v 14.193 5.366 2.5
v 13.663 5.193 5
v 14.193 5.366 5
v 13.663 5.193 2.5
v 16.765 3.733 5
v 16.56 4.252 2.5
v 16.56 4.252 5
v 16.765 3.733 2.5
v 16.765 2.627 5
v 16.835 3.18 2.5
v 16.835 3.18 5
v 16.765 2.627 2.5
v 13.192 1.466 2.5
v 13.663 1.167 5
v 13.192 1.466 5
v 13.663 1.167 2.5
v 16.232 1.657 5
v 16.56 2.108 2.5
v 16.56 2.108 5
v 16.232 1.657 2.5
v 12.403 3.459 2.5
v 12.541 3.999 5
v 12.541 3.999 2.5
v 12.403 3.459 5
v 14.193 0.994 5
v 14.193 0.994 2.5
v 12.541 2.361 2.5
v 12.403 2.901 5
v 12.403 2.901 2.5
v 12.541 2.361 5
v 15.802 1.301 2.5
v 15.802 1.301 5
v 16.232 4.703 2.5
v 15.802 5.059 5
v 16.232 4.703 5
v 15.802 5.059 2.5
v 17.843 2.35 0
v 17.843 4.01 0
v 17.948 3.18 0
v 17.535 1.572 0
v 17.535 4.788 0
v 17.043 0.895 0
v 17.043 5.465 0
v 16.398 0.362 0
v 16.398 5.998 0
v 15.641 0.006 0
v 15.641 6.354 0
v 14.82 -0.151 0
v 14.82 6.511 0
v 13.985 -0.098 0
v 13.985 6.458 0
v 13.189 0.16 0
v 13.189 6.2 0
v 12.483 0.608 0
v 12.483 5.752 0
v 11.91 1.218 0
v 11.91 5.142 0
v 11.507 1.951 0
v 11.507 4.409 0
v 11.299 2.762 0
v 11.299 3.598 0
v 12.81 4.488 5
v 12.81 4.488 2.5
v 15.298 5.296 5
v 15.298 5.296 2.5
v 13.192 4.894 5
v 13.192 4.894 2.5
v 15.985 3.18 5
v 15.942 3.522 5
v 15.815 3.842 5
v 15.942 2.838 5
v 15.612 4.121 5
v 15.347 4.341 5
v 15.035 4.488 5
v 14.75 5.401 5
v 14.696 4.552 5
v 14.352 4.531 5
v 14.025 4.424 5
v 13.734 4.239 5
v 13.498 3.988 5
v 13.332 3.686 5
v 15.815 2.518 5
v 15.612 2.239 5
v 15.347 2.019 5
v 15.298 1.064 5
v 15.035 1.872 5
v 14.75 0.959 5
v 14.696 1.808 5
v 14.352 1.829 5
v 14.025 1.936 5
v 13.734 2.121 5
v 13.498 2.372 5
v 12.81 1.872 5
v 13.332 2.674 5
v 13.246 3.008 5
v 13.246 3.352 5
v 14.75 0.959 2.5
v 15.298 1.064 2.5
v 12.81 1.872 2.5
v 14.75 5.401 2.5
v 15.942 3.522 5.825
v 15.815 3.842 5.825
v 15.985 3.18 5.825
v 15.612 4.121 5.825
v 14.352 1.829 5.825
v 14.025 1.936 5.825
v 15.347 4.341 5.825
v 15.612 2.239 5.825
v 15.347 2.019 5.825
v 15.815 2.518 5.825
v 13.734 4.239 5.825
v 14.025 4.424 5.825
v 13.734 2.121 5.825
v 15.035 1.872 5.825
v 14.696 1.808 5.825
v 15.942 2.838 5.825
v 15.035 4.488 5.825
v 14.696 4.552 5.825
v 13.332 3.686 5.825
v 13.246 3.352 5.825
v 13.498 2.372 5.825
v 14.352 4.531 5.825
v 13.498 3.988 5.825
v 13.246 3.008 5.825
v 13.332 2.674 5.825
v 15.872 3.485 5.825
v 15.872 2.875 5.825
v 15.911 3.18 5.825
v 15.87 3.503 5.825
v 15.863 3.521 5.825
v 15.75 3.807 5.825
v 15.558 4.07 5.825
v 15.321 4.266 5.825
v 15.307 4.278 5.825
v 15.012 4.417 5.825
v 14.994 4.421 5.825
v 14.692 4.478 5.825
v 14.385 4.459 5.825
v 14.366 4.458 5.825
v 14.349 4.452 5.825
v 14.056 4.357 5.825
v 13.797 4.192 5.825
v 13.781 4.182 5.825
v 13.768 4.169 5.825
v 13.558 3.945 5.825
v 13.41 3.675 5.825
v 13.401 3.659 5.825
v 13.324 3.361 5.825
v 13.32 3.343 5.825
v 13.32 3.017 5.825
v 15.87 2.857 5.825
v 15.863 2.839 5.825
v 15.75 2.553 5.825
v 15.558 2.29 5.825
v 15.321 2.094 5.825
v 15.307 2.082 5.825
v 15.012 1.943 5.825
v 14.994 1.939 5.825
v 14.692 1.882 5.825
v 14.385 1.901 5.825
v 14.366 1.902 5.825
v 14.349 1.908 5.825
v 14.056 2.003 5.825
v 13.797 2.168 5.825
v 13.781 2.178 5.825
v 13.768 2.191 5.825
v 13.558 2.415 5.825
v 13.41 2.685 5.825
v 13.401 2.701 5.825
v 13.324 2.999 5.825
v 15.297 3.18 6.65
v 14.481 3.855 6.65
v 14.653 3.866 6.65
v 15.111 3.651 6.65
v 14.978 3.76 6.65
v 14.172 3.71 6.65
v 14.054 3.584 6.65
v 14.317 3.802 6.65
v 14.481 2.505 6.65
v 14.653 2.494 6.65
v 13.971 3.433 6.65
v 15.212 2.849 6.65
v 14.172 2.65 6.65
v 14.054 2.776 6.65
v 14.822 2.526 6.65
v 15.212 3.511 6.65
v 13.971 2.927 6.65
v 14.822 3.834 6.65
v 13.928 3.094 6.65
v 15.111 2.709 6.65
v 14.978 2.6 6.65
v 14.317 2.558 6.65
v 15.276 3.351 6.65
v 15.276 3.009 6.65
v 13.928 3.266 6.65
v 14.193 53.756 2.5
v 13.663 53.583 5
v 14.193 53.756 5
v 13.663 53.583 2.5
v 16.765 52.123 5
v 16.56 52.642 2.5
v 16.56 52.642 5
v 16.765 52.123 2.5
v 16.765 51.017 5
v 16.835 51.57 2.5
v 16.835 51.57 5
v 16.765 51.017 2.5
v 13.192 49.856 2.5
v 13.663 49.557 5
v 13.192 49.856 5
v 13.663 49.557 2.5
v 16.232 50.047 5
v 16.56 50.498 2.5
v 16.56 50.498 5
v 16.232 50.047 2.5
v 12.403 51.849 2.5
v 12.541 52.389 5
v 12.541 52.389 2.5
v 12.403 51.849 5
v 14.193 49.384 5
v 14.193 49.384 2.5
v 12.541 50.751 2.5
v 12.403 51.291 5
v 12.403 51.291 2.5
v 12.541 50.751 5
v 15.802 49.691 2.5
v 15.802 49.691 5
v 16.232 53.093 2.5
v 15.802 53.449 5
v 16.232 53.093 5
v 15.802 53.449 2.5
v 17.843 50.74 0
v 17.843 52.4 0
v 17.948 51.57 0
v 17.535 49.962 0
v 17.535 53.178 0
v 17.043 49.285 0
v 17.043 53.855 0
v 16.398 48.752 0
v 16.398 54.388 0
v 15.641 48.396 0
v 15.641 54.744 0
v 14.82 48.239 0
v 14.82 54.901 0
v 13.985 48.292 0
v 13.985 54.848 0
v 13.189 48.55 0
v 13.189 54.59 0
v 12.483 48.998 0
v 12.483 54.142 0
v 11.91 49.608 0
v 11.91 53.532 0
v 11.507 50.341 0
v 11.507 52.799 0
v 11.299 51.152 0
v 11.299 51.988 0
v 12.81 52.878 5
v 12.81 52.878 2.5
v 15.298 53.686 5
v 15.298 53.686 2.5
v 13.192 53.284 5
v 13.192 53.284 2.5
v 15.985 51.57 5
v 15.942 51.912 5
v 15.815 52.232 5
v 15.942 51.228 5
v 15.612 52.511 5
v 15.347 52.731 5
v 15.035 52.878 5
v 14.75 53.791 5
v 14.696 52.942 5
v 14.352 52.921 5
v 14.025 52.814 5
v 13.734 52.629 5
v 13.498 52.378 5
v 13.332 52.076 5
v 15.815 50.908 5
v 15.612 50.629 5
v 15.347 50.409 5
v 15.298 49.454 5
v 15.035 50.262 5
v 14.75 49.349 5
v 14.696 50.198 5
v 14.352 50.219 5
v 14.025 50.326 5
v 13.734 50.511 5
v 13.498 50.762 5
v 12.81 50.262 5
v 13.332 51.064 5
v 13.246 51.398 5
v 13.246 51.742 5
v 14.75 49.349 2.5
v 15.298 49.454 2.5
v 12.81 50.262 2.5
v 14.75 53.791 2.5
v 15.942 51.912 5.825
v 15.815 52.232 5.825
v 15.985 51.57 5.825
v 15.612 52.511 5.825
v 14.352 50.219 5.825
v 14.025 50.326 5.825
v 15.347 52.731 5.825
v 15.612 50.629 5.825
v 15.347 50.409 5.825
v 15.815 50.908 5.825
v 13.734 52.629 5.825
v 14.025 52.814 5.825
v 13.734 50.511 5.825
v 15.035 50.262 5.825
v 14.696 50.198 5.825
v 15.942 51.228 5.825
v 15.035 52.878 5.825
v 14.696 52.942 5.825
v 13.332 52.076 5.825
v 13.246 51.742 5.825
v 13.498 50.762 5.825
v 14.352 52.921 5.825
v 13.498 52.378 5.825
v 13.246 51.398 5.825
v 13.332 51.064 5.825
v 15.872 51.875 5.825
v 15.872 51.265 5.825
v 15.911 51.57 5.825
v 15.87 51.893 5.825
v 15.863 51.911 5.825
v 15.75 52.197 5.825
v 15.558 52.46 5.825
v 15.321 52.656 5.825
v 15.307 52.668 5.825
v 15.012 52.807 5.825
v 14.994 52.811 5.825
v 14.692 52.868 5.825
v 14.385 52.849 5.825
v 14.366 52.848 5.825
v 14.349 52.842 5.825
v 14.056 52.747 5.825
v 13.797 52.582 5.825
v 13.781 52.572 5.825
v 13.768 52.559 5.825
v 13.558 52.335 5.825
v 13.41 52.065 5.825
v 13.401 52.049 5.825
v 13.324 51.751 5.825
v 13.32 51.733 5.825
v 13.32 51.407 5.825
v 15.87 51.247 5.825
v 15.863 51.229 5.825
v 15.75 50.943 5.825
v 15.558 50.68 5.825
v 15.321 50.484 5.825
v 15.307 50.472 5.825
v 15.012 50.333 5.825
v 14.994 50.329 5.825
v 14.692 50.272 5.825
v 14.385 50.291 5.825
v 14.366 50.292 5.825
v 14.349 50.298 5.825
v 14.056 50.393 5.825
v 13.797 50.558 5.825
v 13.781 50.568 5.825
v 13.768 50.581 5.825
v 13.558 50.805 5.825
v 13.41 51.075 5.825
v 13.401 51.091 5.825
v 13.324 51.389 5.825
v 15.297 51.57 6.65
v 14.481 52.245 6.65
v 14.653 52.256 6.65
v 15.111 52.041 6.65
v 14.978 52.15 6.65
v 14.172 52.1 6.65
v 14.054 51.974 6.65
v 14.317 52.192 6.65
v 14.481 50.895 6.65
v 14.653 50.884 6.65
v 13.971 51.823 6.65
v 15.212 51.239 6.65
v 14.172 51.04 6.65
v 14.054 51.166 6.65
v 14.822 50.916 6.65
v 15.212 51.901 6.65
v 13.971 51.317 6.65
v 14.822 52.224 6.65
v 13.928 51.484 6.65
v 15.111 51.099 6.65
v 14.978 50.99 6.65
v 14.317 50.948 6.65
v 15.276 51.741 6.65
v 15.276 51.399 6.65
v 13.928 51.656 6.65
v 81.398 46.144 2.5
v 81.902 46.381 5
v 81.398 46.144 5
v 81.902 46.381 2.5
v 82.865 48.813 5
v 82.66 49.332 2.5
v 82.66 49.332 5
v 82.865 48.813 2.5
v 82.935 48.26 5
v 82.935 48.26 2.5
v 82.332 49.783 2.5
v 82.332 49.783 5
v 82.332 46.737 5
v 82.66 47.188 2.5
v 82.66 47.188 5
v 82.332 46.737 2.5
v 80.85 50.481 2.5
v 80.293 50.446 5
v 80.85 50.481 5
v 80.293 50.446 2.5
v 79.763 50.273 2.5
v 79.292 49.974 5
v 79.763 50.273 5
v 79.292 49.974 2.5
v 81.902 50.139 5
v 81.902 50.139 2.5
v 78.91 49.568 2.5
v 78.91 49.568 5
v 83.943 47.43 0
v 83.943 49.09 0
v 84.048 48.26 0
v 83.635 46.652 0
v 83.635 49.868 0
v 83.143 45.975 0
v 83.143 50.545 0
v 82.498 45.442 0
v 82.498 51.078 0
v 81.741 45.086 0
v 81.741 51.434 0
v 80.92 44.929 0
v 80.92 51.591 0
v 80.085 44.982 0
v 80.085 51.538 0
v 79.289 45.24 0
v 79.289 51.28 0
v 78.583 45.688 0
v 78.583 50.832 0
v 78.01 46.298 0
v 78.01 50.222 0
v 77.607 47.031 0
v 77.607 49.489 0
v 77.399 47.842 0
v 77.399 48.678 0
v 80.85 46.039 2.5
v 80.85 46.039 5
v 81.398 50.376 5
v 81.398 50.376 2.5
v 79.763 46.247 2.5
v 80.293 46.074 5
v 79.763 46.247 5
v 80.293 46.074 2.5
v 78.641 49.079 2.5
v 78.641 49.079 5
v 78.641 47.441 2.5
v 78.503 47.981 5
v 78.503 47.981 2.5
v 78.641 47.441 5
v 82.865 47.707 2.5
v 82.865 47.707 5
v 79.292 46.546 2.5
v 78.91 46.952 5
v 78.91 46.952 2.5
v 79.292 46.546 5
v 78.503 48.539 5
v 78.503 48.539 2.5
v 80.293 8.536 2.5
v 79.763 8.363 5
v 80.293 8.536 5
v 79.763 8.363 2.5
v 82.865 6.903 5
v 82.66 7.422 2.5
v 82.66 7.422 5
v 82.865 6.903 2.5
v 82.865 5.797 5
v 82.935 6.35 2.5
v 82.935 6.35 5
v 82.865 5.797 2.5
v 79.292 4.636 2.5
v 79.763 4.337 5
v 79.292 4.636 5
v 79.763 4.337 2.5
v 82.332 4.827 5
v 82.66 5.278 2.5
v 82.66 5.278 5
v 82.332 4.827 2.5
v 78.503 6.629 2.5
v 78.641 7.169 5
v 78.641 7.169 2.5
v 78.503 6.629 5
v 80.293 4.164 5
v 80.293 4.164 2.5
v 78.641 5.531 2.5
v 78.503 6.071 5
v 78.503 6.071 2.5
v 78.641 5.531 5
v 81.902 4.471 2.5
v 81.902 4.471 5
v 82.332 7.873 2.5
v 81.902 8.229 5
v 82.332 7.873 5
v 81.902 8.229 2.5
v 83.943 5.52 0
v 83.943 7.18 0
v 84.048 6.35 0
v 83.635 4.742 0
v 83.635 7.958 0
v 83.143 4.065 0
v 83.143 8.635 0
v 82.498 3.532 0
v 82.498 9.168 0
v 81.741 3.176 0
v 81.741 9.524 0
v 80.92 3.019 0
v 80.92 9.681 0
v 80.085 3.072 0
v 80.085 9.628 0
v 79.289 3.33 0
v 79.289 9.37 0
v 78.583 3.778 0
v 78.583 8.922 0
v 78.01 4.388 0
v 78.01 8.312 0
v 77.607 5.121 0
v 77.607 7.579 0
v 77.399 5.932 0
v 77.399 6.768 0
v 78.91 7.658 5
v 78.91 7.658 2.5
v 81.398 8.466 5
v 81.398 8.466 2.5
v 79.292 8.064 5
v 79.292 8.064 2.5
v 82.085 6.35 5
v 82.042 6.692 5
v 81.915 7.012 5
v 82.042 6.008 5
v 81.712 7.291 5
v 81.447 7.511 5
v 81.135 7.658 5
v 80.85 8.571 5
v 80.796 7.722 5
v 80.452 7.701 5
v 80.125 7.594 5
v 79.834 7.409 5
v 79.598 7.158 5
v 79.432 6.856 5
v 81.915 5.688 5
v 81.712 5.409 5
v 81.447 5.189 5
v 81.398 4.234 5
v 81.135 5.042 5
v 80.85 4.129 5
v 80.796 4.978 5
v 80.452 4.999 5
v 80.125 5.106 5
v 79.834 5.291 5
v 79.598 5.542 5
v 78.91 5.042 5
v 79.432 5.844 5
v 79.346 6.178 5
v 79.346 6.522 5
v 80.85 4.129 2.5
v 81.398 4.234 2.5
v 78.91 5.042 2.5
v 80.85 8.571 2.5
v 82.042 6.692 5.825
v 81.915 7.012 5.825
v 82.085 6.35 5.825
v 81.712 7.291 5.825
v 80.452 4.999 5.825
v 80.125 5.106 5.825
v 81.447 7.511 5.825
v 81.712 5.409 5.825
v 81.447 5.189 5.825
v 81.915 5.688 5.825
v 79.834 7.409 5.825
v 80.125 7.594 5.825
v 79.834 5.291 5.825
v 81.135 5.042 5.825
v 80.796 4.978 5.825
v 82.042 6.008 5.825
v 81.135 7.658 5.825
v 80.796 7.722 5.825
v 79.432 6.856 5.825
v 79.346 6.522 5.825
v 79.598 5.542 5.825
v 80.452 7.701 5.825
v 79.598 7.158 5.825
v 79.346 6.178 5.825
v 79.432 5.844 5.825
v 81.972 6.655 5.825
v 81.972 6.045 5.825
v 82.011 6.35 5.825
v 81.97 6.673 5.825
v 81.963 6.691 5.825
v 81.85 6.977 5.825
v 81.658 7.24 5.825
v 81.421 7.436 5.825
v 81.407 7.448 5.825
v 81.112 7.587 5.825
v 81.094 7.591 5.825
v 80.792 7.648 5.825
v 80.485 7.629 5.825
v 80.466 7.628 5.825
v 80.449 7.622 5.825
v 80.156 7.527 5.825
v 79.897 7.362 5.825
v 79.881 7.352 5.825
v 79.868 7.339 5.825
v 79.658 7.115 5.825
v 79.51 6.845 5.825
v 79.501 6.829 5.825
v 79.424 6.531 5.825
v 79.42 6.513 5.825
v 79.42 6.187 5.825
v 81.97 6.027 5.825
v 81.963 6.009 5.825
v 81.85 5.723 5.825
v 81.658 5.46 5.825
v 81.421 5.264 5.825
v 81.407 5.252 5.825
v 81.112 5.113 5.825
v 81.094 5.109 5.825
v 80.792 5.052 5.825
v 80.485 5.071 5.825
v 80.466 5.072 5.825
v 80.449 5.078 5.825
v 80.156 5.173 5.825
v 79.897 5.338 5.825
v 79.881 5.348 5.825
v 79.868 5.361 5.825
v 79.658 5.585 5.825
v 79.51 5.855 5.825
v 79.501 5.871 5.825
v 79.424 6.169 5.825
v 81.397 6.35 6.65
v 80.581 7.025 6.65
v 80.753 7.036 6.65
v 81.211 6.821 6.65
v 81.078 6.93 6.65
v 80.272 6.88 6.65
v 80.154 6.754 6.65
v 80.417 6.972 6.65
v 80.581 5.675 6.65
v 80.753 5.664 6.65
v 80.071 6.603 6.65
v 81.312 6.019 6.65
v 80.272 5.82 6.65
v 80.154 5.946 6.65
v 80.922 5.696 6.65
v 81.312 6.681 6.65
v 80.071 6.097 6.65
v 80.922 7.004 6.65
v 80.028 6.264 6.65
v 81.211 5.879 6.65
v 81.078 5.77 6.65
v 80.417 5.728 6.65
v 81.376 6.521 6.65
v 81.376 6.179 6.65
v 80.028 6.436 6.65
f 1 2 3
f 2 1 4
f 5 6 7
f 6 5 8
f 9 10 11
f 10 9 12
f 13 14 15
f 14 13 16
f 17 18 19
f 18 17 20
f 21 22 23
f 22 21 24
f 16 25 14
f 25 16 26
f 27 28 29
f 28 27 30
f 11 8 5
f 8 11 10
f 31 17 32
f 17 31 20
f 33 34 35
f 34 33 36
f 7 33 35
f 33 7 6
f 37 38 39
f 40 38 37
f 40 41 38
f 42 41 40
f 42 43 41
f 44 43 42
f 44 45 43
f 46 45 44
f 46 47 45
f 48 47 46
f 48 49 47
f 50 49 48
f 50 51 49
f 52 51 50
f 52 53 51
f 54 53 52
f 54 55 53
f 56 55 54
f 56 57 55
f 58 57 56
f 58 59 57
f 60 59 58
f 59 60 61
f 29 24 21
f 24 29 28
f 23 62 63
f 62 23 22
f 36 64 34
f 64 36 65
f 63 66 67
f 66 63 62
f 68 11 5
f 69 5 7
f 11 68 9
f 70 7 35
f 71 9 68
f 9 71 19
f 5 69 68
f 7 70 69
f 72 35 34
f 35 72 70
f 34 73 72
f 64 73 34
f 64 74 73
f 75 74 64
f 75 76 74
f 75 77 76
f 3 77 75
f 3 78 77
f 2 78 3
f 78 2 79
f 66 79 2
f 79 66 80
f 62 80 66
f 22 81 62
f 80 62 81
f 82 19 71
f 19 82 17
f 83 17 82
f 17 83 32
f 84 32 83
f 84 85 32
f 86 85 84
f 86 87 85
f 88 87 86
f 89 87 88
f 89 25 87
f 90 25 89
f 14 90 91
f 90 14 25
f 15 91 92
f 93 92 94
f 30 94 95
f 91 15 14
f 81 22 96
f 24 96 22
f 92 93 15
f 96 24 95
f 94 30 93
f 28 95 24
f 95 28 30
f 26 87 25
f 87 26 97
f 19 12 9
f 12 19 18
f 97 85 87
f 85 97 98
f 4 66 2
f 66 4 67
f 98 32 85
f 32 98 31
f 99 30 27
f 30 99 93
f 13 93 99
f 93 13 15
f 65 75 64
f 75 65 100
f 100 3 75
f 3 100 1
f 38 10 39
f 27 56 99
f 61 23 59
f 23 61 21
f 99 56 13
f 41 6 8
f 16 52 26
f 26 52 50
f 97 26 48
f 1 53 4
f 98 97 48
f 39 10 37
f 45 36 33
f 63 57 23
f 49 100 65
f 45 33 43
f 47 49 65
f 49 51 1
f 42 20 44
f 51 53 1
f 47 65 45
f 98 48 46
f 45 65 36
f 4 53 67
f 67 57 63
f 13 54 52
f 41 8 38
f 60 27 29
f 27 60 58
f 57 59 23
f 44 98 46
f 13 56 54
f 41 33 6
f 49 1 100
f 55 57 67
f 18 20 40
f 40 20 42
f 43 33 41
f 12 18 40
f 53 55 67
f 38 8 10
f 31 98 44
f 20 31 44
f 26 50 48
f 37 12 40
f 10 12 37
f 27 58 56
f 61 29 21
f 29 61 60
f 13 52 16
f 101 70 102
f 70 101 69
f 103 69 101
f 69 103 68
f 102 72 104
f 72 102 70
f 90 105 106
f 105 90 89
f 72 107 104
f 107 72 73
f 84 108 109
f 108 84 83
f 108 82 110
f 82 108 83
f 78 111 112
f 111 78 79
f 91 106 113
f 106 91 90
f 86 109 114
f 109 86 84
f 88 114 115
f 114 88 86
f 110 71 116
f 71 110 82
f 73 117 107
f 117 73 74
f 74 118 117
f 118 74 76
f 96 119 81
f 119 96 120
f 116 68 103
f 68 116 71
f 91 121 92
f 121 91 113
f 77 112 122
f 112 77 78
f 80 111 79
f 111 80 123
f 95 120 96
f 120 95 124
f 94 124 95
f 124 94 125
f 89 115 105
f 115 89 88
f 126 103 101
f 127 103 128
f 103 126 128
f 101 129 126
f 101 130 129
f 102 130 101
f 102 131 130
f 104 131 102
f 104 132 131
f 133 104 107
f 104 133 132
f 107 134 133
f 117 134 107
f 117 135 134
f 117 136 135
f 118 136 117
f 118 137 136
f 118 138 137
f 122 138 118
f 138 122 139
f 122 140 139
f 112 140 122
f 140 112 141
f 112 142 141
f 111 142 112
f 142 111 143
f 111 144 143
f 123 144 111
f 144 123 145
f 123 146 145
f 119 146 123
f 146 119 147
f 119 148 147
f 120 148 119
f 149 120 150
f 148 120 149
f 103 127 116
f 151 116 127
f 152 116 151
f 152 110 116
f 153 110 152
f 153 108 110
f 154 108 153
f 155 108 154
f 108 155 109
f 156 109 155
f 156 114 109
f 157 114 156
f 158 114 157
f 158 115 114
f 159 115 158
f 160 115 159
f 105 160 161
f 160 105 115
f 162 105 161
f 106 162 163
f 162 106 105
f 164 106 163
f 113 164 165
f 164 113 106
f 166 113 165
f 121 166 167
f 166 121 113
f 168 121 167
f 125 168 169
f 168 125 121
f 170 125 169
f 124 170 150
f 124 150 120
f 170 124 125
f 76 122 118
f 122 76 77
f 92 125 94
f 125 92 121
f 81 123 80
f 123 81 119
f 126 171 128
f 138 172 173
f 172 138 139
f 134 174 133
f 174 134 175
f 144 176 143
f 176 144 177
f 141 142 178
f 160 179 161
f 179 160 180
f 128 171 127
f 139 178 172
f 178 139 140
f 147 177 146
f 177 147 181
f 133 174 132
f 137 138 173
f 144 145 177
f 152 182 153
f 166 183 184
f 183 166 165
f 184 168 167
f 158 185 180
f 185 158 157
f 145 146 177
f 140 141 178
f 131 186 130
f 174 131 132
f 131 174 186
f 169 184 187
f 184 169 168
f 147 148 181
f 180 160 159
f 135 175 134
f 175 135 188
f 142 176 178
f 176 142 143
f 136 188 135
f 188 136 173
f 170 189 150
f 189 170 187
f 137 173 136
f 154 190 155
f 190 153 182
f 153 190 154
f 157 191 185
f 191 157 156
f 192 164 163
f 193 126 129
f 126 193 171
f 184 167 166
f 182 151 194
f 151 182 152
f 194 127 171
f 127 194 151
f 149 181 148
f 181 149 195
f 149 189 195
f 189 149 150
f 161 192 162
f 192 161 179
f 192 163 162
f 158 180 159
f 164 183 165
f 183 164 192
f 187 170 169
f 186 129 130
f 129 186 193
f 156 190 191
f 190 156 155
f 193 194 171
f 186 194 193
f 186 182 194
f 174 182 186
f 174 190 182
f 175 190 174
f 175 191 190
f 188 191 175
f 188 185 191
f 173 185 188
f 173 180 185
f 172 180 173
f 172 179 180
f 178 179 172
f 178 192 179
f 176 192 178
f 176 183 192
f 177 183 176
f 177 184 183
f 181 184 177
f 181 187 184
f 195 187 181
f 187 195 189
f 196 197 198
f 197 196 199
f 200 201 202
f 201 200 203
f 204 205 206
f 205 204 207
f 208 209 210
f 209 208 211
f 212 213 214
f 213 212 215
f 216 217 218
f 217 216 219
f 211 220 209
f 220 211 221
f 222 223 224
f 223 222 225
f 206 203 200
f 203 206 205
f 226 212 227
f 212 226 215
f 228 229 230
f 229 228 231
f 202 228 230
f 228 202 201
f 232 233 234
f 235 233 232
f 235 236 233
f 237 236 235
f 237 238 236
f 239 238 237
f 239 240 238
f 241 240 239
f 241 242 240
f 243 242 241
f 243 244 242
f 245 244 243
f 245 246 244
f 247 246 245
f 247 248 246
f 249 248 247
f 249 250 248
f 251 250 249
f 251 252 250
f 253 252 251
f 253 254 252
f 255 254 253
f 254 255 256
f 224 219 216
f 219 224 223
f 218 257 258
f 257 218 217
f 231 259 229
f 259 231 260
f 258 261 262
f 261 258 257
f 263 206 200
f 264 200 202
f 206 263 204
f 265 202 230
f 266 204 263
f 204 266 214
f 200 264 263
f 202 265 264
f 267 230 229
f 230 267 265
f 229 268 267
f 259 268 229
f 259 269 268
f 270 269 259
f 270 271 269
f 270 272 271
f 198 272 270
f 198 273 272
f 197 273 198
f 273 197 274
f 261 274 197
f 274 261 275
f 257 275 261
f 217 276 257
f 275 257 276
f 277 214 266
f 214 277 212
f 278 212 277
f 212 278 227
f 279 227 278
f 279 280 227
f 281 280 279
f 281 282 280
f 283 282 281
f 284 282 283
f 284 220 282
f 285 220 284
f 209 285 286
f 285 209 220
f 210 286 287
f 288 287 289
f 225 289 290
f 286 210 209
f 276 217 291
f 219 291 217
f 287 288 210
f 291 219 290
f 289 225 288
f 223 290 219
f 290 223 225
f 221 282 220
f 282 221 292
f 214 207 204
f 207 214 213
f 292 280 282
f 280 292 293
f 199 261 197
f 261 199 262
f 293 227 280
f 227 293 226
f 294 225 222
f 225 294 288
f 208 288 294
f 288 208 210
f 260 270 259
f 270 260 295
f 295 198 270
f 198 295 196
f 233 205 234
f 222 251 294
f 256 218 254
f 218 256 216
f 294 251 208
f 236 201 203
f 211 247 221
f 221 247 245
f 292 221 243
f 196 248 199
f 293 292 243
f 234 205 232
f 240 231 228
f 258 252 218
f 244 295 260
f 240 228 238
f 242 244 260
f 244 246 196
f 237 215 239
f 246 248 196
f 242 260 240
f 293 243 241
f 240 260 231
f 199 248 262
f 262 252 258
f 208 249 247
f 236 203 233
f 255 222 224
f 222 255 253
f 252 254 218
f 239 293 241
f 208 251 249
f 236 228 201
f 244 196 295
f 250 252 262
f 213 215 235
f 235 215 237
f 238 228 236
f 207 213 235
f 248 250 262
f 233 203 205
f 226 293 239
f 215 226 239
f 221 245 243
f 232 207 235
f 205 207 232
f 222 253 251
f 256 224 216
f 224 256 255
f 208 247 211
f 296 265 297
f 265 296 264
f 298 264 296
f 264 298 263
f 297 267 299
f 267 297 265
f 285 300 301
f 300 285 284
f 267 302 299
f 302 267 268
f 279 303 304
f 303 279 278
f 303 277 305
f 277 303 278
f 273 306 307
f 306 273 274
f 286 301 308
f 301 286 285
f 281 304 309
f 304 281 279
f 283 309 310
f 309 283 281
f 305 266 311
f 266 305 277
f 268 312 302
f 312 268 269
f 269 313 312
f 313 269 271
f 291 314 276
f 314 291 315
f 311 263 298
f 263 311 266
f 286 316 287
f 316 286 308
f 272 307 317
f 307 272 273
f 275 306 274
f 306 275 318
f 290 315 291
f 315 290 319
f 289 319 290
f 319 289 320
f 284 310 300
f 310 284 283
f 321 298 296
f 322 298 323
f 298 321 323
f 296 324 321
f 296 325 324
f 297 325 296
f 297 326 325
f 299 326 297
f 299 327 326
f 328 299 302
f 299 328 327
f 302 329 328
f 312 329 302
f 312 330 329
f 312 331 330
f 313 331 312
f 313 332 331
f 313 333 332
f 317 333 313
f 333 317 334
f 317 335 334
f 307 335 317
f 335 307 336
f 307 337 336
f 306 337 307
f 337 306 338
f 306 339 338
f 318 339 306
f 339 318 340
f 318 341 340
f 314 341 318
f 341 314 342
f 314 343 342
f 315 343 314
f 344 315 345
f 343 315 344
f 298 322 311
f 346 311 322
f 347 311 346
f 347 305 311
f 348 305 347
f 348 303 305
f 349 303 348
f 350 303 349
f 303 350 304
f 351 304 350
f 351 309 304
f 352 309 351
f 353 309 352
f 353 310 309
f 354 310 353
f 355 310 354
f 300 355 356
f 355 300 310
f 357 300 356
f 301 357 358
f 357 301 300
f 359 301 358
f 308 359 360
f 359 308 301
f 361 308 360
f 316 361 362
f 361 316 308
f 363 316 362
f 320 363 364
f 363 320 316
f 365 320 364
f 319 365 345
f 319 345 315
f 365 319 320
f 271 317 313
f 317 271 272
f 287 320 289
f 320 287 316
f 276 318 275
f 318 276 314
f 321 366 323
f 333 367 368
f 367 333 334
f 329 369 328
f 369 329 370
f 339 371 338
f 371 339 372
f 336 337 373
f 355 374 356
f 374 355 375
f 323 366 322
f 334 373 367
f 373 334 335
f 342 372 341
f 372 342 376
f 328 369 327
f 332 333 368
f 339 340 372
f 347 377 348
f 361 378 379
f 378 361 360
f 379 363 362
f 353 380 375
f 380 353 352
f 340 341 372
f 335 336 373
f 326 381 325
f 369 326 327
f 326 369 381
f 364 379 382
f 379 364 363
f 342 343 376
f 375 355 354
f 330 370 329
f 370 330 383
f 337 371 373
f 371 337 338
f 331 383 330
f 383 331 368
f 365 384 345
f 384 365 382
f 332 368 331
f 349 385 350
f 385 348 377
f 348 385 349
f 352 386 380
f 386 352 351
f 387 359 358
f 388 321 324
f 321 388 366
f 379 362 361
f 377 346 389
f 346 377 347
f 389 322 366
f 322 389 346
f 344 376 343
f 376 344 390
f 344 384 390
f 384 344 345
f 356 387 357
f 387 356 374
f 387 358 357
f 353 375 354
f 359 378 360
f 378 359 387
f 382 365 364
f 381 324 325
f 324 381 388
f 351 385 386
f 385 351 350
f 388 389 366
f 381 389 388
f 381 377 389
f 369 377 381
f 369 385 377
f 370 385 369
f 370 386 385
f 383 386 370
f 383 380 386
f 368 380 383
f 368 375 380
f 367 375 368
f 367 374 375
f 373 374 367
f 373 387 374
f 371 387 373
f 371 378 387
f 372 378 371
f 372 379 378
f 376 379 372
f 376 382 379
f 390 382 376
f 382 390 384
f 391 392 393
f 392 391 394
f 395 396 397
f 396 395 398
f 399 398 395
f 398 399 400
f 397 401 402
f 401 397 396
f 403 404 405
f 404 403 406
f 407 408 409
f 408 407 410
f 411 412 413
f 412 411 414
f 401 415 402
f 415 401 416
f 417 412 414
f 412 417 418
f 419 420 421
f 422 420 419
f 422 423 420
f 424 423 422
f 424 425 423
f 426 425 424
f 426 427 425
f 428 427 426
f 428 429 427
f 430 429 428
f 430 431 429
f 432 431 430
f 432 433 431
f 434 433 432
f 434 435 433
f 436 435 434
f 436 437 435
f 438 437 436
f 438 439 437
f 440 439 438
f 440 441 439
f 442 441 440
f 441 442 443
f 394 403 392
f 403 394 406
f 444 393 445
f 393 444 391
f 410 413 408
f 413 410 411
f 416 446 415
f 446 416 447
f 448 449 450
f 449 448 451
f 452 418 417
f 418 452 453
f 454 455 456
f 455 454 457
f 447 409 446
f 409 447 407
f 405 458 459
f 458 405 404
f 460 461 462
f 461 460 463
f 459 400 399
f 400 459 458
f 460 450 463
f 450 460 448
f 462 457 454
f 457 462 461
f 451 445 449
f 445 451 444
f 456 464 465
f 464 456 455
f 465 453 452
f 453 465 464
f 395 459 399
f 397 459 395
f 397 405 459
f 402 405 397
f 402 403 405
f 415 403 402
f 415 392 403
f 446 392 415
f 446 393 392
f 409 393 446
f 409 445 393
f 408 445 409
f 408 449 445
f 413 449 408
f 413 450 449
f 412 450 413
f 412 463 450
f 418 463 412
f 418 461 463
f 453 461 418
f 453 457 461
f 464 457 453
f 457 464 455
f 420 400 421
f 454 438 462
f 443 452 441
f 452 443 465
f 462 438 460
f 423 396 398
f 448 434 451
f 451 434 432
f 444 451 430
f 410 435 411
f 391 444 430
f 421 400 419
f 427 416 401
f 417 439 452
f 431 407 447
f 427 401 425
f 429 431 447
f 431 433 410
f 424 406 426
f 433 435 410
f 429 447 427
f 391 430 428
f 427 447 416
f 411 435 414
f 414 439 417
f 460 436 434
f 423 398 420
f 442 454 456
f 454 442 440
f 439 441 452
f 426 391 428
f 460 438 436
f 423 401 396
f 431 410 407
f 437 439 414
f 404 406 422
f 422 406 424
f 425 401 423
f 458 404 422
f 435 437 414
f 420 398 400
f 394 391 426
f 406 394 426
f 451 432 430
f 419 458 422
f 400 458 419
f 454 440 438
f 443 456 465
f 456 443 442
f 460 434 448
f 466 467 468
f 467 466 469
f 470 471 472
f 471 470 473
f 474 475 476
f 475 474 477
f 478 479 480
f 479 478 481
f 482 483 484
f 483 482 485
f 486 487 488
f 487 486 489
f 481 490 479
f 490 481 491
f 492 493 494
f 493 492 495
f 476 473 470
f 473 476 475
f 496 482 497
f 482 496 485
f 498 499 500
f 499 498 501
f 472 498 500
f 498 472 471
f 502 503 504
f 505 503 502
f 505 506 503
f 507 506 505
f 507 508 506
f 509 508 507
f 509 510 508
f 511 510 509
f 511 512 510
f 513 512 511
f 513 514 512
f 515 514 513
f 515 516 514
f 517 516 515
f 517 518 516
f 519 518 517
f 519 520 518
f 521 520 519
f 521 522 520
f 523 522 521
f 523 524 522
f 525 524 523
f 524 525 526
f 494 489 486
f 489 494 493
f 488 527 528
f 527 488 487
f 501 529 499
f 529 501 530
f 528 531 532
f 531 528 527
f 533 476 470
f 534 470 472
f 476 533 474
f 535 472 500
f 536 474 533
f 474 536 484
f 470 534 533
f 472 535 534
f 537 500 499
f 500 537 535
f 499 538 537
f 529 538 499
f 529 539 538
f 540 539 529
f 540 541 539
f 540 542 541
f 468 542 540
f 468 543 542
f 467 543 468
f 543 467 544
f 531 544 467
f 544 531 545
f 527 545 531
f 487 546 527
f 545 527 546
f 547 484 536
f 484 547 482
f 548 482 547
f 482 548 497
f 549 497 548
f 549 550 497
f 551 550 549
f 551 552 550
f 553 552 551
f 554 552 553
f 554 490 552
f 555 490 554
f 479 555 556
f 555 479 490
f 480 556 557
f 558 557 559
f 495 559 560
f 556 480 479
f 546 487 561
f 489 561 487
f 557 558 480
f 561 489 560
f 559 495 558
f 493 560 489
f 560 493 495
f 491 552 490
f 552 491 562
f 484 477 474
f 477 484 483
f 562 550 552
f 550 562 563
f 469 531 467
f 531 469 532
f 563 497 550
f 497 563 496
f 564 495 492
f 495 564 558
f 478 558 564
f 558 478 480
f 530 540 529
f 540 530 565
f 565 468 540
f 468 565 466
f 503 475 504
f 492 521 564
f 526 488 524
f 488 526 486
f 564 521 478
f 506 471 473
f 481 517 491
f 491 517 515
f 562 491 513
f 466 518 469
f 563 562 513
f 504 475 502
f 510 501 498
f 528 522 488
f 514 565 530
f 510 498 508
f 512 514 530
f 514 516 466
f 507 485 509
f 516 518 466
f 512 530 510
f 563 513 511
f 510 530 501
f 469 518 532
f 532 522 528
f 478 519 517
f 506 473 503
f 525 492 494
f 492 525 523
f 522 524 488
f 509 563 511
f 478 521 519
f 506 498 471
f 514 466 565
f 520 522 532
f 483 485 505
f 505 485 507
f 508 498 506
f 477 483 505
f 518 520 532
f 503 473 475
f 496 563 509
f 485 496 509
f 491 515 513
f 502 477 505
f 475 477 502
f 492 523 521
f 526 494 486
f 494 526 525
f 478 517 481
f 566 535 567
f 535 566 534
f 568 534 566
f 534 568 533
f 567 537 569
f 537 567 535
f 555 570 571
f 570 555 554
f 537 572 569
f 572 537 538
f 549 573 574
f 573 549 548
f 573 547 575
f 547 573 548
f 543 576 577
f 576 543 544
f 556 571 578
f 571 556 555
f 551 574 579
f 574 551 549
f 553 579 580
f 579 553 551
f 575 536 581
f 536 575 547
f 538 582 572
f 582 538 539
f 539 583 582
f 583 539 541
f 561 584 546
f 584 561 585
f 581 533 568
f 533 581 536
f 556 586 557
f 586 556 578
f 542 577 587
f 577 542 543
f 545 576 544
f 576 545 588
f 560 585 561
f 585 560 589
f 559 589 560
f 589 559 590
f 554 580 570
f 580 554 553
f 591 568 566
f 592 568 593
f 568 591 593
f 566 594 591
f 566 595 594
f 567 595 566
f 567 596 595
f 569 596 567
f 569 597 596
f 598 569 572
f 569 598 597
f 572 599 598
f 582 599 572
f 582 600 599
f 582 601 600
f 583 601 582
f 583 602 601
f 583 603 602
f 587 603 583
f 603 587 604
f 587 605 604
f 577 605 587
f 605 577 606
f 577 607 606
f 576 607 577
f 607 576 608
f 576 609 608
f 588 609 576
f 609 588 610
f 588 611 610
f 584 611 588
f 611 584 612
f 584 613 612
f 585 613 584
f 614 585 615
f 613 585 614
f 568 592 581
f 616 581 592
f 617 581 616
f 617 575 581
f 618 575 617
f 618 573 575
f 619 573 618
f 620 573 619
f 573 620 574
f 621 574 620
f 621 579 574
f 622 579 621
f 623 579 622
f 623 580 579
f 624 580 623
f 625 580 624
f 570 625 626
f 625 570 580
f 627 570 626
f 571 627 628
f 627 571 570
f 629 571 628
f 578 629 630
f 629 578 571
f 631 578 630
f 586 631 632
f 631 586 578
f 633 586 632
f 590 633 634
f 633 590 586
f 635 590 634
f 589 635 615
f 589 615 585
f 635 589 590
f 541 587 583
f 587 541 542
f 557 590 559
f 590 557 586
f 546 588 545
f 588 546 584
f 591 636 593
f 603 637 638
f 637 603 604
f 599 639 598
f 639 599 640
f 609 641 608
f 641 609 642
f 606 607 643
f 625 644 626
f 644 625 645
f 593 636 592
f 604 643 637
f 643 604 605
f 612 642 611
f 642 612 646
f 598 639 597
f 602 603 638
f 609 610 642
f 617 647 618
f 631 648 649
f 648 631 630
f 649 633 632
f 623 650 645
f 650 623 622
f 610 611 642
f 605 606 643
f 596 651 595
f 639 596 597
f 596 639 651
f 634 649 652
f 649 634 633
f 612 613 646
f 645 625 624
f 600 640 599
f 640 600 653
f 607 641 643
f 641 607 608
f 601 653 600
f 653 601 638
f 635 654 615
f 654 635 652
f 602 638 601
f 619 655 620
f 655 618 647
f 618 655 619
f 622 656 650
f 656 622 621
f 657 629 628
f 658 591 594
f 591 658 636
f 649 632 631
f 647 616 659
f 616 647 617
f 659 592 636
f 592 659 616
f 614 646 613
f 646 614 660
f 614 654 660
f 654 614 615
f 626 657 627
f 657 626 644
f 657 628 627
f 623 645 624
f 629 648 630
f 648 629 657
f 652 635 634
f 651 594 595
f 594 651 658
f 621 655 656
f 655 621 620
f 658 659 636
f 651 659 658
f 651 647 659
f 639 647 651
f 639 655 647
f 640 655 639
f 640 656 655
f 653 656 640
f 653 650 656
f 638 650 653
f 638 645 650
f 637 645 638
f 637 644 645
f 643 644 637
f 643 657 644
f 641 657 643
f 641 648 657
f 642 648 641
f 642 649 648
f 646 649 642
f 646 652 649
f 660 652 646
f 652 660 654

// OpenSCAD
// file: BBB_SlimCase_v2_Library.scad
// ******************************************
// Beaglebone Black Slim Case Library
// Functions and Constants
// By Isaac Hayes
// Copyright 2014
// http://scuttlebots.com
//
// This program is free software; you can redistribute it and/or modify
// it under the terms of the GNU General Public License as published by
// the Free Software Foundation; either version 2 of the License, or
// (at your option) any later version.
//
// This program is distributed in the hope that it will be useful,
// but WITHOUT ANY WARRANTY; without even the implied warranty of
// MERCHANTABILITY or FITNESS FOR A PARTICULAR PURPOSE.  See the
// GNU General Public License for more details.
//
// You should have received a copy of the GNU General Public License along
// with this program; if not, write to the Free Software Foundation, Inc.,
// 51 Franklin Street, Fifth Floor, Boston, MA 02110-1301 USA.
// ******************************************

// ************************************
// Dimensions and Locations Math(s)
// ************************************

// -All dimensions in millimeters
// -Origin at bottom left corner of PCB
// -Ethernet and power jack face left closest to origin
// -X and Y refer to position of lower left corner of compoenent from origin
// -Z refers to distance from top of component to the PCB
// -L and W are Lenght(X) and Width(Y) to specify component size

//Board Dimensions
BB_L = 100.36;
BB_W = 84.61;
BB_Z = 1.65;
BB_SmCurve_R = 6.35;
BB_LgCurve_R = 12.70;

//Mounting Hole Locations (Clockwise from Bottom)
BB_Hole1X = 14.61;
BB_Hole1Y = 3.18;

BB_Hole2X = 14.61;
BB_Hole2Y = BB_Hole1Y + 48.39;

BB_Hole3X = BB_Hole1X + 66.10;
BB_Hole3Y = 6.35 + 41.91;

BB_Hole4X = BB_Hole1X + 66.10;
BB_Hole4Y = 6.35;

BB_Hole_ID = 2.75;
BB_Hole_OD = 4.45;

//Pin Headers
BB_P9_X = 18.415;
BB_P9_Y = 0.635;
BB_P9_Z = 8.60;
BB_P9_L = 58.42;
BB_P9_W = 5.08;

BB_P8_X = 18.415;
BB_P8_Y = 48.895;
BB_P8_Z = 8.60;
BB_P8_L = 58.42;
BB_P8_W = 5.08;

//Capacitor
BB_Cap_X = 65.00;
BB_Cap_Y = 8.00;
BB_Cap_Z = 11.00;
BB_Cap_L = 6.00;
BB_Cap_W = 6.00;

//Power jack
BB_PJack_X = -2.54;
BB_PJack_Y = 5.461;
BB_PJack_Z = 10.75;
BB_PJack_L = 14.15;
BB_PJack_W = 9.00;

//4 USB
BB_Eth_X = -2.54;
BB_Eth_Y = 7;
BB_Eth_Z = 13.33;
BB_Eth_L = 10;
BB_Eth_W = 31;

//DHT
BB_DHT_X = BB_L - 75;
BB_DHT_Y = 84.59 + 0.1;
BB_DHT_Z = -0.5;
BB_DHT_L = 8.50;
BB_DHT_W = 6.55;
BB_DHT_ZH = 1;

//USB MINI POWER
BB_USBD_X = -0.635;
BB_USBD_Y = 37.005 + 0.60;
BB_USBD_Z = 4.00;
BB_USBD_L = 6.91;
BB_USBD_W = 7.747;

//PH
BB_PH_X = BB_L + 0.635 - 27.50;
BB_PH_Y = 84.59 + 0.1;
BB_PH_Z = -2;
BB_PH_L = 7.50;
BB_PH_W = 6.55;

//MicroSD Card Port (Slot only)
BB_SD_X = BB_L - 14.90;
BB_SD_Y = 30.607 + 0.5;
BB_SD_Z = 1.75 - 0.5;
BB_SD_L = 14.90;
BB_SD_W = 11.05;

//CASE DIMENSIONS
//Outer Shell
Case_Thickness = 1.50;     //Wall Thickness
Case_Gap = 0.25;  //Gap between case walls and board
Case_L = BB_L + Case_Thickness*2 + Case_Gap*2;
Case_W = BB_W + Case_Thickness*2 + Case_Gap*2;
Case_SmCurve_R = BB_SmCurve_R + Case_Thickness + Case_Gap;
Case_LgCurve_R = BB_LgCurve_R + Case_Thickness + Case_Gap;
Case_PCB_Z = BB_USBD_Z + 1.00;      //Height PCB is suspended above case floor
Case_Z = Case_Thickness + Case_PCB_Z + BB_Z + BB_P9_Z;      //Total height of case
Cmp_Gap = 0.25;      //Gap around components
Cmp_Gap2 = Cmp_Gap*2;   //Gap around components times two

//Shell hollow inside dimensions
CutOut_L = BB_L + Case_Gap*2;
CutOut_W = BB_W + Case_Gap*2;
CutOut_SmCurve_R = BB_SmCurve_R + Case_Gap;
CutOut_LgCurve_R = BB_LgCurve_R + Case_Gap;
CutOut_Z = Case_Z - Case_Thickness;

//Lid Dimensions
Lid_Thickness = 2.00;
Lid_Grip_Thickness = 2.00;
Lid_Grip_Z = 3.00;
Lid_Grip_SmR = Case_SmCurve_R - Case_Thickness;
Lid_Grip_LgR = Case_LgCurve_R - Case_Thickness;

//Dev Station Rail Dimensions
DSR_L = Case_L - Case_LgCurve_R - Case_SmCurve_R;
DSR_W = 2.0;
DSR_H = 3.0;
DSRH_W = 4.0;

// ************************************
// cornerRoundedCube Module - See source below
// ************************************

// http://codeviewer.org/view/code:1b36 
// Copyright (C) 2011 Sergio Vilches
// This program is free software: you can redistribute it and/or modify it under the terms of the GNU General Public License as published by the Free Software Foundation, either version 3 of the License, or (at your option) any later version.
// This program is distributed in the hope that it will be useful, but WITHOUT ANY WARRANTY; without even the implied warranty of MERCHANTABILITY or FITNESS FOR A PARTICULAR PURPOSE. See the GNU General Public License for more details. You should have received a copy of the GNU General Public License along with this program. If not, see <http://www.gnu.org/licenses/>.
// Contact: s.vilches.e@gmail.com


//     ----------------------------------------------------------- 
//                  Round Corners Cube (Extruded)                
//       roundCornersCube(x,y,z,r) Where:                        
//          - x = Xdir width                                     
//          - y = Ydir width                                     
//          - z = Height of the cube                             
//          - r = Rounding radious                               
                                                              
//       Example: roundCornerCube(10,10,2,1);                    
//      *Some times it's needed to use F6 to see good results!   
//  	 ----------------------------------------------------------- 

// Code was modified to not use centered cubes - Isaac


module createMeniscus(h,radius) // This module creates the shape that needs to be substracted from a cube to make its corners rounded.
difference(){        //This shape is basicly the difference between a quarter of cylinder and a cube
   translate([radius/2+0.1,radius/2+0.1,0]){
      cube([radius+0.2,radius+0.1,h+0.2],center=true);         // All that 0.x numbers are to avoid "ghost boundaries" when substracting
   }

   cylinder(h=h+0.2,r=radius,$fn = 50,center=true);
}


module roundCornersCube(x,y,z,r)  // Now we just substract the shape we have created in the four corners
difference(){
   cube([x,y,z], center=false);

   translate([x-r,y-r,z/2]){  // We move to the first corner (x,y)
      rotate(0){  
         createMeniscus(z,r); // And substract the meniscus
      }
   }
   translate([r,y-r,z/2]){ // To the second corner (-x,y)
      rotate(90){
         createMeniscus(z,r); // But this time we have to rotate the meniscus 90 deg
      }
   }
   translate([r,r,z/2]){ // ... 
      rotate(180){
         createMeniscus(z,r);
      }
   }
   translate([x-r,r,z/2]){
      rotate(270){
         createMeniscus(z,r);
      }
   }
}
// main file
// ******************************************
// Beaglebone Black Slim Case
// By Isaac Hayes
// Copyright 2014
// http://scuttlebots.com
//
// This program is free software; you can redistribute it and/or modify
// it under the terms of the GNU General Public License as published by
// the Free Software Foundation; either version 2 of the License, or
// (at your option) any later version.
//
// This program is distributed in the hope that it will be useful,
// but WITHOUT ANY WARRANTY; without even the implied warranty of
// MERCHANTABILITY or FITNESS FOR A PARTICULAR PURPOSE.  See the
// GNU General Public License for more details.
//
// You should have received a copy of the GNU General Public License along
// with this program; if not, write to the Free Software Foundation, Inc.,
// 51 Franklin Street, Fifth Floor, Boston, MA 02110-1301 USA.
// ******************************************

// ************************************
// Render Options
// ************************************

// RENDER OPTIONS
// Set this variable to output the piece you want
// 0 - No Render
// 1 - Visual Only render
// 2 - Base for STL Export
// 3 - Lid for STL Export

   Render_Options = 2;

// LID OPTIONS
// Set this to select various lid Options
// 0 = Solid
// 1 = Pin Header Cut Outs

   Lid_Options = 0;

// DEV STATION OPTIONS
// Set this to add bottom rails for attachment to the BBB Dev Station Sled accessory
// 0 = Case Only
// 1 = Include rails

	DevRails_Options = 0;

// ************************************
// Include External Libraries
// ************************************

// 
include <BBB_SlimCase_v2_Library.scad>

// ************************************
// Dimensions and Locations Math(s)
// ************************************

// -All dimensions in millimeters
// -Origin at bottom left corner of PCB
// -Ethernet and power jack face left closest to origin
// -X and Y refer to position of lower left corner of compoenent from origin
// -Z refers to distance from top of component to the PCB
// -L and W are Lenght(X) and Width(Y) to specify component size


// ************************************
// Components
// ************************************

module Base()
{
		//Mounting pegs
		translate([BB_Hole1X,BB_Hole1Y,0]) MountingPeg();
		translate([BB_Hole2X,BB_Hole2Y,0]) MountingPeg();
		translate([BB_Hole3X,BB_Hole3Y,0]) MountingPegFlat();
		translate([BB_Hole4X,BB_Hole4Y,0]) MountingPeg();

}

module Lid()
{
	difference() {	
		translate([-Case_Thickness-Case_Gap, -Case_Thickness-Case_Gap, -Case_Thickness]) {
		union() {
			//
			translate([0,0,Case_Z]) roundCornersCube(Case_L-Case_LgCurve_R, Case_W, Lid_Thickness, Case_SmCurve_R);
			translate ([Case_SmCurve_R,0,Case_Z]) roundCornersCube(Case_L-Case_SmCurve_R, Case_W, Lid_Thickness, Case_LgCurve_R);

			//Lid Grips
			translate([Case_Thickness,Case_Thickness,Case_Z-Lid_Grip_Z]) CornerGrip(Lid_Grip_SmR,Lid_Grip_Thickness,Lid_Grip_Z,0,0);
			translate([Case_L-Case_Thickness,Case_Thickness,Case_Z-Lid_Grip_Z]) CornerGrip(Lid_Grip_LgR,Lid_Grip_Thickness,Lid_Grip_Z,90,4);
			translate([Case_L-Case_Thickness,Case_W-Case_Thickness,Case_Z-Lid_Grip_Z]) CornerGrip(Lid_Grip_LgR,Lid_Grip_Thickness,Lid_Grip_Z,180,4);
			translate([Case_Thickness,Case_W-Case_Thickness,Case_Z-Lid_Grip_Z]) CornerGrip(Lid_Grip_SmR,Lid_Grip_Thickness,Lid_Grip_Z,270,0);
			translate([Case_Thickness,BB_PJack_Y+Case_Thickness+Case_Gap,Case_Z-Lid_Grip_Z]) cube([Lid_Grip_Thickness, BB_Eth_Y-BB_PJack_Y, Lid_Grip_Z]);
		}}

		//Component Cutouts
		
		//Ethernet Jack
		translate([BB_Eth_X-Cmp_Gap-1.25, BB_Eth_Y-Cmp_Gap, Case_PCB_Z+BB_Z]) cube([BB_Eth_L+Cmp_Gap2+1.25, BB_Eth_W+Cmp_Gap2, BB_Eth_Z+Cmp_Gap]);
		//Power Jack
		translate([BB_PJack_X-Cmp_Gap-1.25, BB_PJack_Y-Cmp_Gap, Case_PCB_Z+BB_Z]) cube([BB_PJack_L+Cmp_Gap2+1.25, BB_PJack_W+Cmp_Gap2, BB_PJack_Z+Cmp_Gap]);
		//Pin Headers
		if (Lid_Options == 1) {
			translate([BB_P8_X-Cmp_Gap, BB_P8_Y-Cmp_Gap, 0]) cube([BB_P8_L+Cmp_Gap2, BB_P8_W +Cmp_Gap2, 75]);
			translate([BB_P9_X-Cmp_Gap, BB_P9_Y-Cmp_Gap, 0]) cube([BB_P9_L+Cmp_Gap2, BB_P9_W +Cmp_Gap2, 75]);
		}
		//Capacitor
		translate([BB_Cap_X, BB_Cap_Y, Case_PCB_Z+BB_Z]) cube([BB_Cap_L, BB_Cap_W, BB_Cap_Z]);

		
	}
}

module MountingPeg()
{
	union() {
		cylinder(h=Case_PCB_Z, d=BB_Hole_OD, $fn=25);
		cylinder(h=Case_PCB_Z/2, d1=BB_Hole_OD*1.5, d2=BB_Hole_OD, $fn=25);
		translate([0,0,Case_PCB_Z-0.1]) cylinder(h=BB_Z/2+0.1,d=BB_Hole_ID, $fn=25);
		translate([0,0,Case_PCB_Z+BB_Z/2-0.1]) cylinder(h=BB_Z/2+0.1,d1=BB_Hole_ID, d2=BB_Hole_ID/2, $fn=25);
	}
}

module MountingPegFlat()
{
	union() {
		cylinder(h=Case_PCB_Z, d=BB_Hole_OD, $fn=25);
		cylinder(h=Case_PCB_Z/2, d1=BB_Hole_OD*1.5, d2=BB_Hole_OD, $fn=25);
		//translate([0,0,Case_PCB_Z-0.1]) cylinder(h=BB_Z/2+0.1,d=BB_Hole_ID, $fn=25);
		//translate([0,0,Case_PCB_Z+BB_Z/2-0.1]) cylinder(h=BB_Z/2+0.1,d1=BB_Hole_ID, d2=BB_Hole_ID/2, $fn=25);
	}
}

module CornerGrip(R,T,Z,D,CutOff)
{
	rotate([0,0,D]) {
		difference() {
			translate([R,R,0]) cylinder(r=R, h=Z, $fn=50);
			translate([R,R,0]) cylinder(r=R-T, h=Z, $fn=50);
			translate([R-CutOff,0,0]) cube([R*2+CutOff,R*2+CutOff,Z]);
			translate([0,R-CutOff,0]) cube([R*2+CutOff,R*2+CutOff,Z]);
		}
	}
}

module DevRail(X, Y, Z)
{
	SZ = Z * cos(45);
	union() {
		cube([X,Y,Z]);
		translate([0,Y,0]) rotate([45,0,0]) cube([X,SZ,SZ]);
	}
}

// ************************************
// Output Renders
// ************************************

color("Green"){
	render(convexity=4) {
		if (Render_Options == 1) {
			Base();
			translate([0,0,2]) Lid();
		}
		if (Render_Options == 2) {
			Base();
		}
		if (Render_Options == 3) {
			rotate([180,0,0]) translate([-Case_L/2,-Case_W/2,-Case_Z-Case_Thickness]) Lid();
		}
	}
}
